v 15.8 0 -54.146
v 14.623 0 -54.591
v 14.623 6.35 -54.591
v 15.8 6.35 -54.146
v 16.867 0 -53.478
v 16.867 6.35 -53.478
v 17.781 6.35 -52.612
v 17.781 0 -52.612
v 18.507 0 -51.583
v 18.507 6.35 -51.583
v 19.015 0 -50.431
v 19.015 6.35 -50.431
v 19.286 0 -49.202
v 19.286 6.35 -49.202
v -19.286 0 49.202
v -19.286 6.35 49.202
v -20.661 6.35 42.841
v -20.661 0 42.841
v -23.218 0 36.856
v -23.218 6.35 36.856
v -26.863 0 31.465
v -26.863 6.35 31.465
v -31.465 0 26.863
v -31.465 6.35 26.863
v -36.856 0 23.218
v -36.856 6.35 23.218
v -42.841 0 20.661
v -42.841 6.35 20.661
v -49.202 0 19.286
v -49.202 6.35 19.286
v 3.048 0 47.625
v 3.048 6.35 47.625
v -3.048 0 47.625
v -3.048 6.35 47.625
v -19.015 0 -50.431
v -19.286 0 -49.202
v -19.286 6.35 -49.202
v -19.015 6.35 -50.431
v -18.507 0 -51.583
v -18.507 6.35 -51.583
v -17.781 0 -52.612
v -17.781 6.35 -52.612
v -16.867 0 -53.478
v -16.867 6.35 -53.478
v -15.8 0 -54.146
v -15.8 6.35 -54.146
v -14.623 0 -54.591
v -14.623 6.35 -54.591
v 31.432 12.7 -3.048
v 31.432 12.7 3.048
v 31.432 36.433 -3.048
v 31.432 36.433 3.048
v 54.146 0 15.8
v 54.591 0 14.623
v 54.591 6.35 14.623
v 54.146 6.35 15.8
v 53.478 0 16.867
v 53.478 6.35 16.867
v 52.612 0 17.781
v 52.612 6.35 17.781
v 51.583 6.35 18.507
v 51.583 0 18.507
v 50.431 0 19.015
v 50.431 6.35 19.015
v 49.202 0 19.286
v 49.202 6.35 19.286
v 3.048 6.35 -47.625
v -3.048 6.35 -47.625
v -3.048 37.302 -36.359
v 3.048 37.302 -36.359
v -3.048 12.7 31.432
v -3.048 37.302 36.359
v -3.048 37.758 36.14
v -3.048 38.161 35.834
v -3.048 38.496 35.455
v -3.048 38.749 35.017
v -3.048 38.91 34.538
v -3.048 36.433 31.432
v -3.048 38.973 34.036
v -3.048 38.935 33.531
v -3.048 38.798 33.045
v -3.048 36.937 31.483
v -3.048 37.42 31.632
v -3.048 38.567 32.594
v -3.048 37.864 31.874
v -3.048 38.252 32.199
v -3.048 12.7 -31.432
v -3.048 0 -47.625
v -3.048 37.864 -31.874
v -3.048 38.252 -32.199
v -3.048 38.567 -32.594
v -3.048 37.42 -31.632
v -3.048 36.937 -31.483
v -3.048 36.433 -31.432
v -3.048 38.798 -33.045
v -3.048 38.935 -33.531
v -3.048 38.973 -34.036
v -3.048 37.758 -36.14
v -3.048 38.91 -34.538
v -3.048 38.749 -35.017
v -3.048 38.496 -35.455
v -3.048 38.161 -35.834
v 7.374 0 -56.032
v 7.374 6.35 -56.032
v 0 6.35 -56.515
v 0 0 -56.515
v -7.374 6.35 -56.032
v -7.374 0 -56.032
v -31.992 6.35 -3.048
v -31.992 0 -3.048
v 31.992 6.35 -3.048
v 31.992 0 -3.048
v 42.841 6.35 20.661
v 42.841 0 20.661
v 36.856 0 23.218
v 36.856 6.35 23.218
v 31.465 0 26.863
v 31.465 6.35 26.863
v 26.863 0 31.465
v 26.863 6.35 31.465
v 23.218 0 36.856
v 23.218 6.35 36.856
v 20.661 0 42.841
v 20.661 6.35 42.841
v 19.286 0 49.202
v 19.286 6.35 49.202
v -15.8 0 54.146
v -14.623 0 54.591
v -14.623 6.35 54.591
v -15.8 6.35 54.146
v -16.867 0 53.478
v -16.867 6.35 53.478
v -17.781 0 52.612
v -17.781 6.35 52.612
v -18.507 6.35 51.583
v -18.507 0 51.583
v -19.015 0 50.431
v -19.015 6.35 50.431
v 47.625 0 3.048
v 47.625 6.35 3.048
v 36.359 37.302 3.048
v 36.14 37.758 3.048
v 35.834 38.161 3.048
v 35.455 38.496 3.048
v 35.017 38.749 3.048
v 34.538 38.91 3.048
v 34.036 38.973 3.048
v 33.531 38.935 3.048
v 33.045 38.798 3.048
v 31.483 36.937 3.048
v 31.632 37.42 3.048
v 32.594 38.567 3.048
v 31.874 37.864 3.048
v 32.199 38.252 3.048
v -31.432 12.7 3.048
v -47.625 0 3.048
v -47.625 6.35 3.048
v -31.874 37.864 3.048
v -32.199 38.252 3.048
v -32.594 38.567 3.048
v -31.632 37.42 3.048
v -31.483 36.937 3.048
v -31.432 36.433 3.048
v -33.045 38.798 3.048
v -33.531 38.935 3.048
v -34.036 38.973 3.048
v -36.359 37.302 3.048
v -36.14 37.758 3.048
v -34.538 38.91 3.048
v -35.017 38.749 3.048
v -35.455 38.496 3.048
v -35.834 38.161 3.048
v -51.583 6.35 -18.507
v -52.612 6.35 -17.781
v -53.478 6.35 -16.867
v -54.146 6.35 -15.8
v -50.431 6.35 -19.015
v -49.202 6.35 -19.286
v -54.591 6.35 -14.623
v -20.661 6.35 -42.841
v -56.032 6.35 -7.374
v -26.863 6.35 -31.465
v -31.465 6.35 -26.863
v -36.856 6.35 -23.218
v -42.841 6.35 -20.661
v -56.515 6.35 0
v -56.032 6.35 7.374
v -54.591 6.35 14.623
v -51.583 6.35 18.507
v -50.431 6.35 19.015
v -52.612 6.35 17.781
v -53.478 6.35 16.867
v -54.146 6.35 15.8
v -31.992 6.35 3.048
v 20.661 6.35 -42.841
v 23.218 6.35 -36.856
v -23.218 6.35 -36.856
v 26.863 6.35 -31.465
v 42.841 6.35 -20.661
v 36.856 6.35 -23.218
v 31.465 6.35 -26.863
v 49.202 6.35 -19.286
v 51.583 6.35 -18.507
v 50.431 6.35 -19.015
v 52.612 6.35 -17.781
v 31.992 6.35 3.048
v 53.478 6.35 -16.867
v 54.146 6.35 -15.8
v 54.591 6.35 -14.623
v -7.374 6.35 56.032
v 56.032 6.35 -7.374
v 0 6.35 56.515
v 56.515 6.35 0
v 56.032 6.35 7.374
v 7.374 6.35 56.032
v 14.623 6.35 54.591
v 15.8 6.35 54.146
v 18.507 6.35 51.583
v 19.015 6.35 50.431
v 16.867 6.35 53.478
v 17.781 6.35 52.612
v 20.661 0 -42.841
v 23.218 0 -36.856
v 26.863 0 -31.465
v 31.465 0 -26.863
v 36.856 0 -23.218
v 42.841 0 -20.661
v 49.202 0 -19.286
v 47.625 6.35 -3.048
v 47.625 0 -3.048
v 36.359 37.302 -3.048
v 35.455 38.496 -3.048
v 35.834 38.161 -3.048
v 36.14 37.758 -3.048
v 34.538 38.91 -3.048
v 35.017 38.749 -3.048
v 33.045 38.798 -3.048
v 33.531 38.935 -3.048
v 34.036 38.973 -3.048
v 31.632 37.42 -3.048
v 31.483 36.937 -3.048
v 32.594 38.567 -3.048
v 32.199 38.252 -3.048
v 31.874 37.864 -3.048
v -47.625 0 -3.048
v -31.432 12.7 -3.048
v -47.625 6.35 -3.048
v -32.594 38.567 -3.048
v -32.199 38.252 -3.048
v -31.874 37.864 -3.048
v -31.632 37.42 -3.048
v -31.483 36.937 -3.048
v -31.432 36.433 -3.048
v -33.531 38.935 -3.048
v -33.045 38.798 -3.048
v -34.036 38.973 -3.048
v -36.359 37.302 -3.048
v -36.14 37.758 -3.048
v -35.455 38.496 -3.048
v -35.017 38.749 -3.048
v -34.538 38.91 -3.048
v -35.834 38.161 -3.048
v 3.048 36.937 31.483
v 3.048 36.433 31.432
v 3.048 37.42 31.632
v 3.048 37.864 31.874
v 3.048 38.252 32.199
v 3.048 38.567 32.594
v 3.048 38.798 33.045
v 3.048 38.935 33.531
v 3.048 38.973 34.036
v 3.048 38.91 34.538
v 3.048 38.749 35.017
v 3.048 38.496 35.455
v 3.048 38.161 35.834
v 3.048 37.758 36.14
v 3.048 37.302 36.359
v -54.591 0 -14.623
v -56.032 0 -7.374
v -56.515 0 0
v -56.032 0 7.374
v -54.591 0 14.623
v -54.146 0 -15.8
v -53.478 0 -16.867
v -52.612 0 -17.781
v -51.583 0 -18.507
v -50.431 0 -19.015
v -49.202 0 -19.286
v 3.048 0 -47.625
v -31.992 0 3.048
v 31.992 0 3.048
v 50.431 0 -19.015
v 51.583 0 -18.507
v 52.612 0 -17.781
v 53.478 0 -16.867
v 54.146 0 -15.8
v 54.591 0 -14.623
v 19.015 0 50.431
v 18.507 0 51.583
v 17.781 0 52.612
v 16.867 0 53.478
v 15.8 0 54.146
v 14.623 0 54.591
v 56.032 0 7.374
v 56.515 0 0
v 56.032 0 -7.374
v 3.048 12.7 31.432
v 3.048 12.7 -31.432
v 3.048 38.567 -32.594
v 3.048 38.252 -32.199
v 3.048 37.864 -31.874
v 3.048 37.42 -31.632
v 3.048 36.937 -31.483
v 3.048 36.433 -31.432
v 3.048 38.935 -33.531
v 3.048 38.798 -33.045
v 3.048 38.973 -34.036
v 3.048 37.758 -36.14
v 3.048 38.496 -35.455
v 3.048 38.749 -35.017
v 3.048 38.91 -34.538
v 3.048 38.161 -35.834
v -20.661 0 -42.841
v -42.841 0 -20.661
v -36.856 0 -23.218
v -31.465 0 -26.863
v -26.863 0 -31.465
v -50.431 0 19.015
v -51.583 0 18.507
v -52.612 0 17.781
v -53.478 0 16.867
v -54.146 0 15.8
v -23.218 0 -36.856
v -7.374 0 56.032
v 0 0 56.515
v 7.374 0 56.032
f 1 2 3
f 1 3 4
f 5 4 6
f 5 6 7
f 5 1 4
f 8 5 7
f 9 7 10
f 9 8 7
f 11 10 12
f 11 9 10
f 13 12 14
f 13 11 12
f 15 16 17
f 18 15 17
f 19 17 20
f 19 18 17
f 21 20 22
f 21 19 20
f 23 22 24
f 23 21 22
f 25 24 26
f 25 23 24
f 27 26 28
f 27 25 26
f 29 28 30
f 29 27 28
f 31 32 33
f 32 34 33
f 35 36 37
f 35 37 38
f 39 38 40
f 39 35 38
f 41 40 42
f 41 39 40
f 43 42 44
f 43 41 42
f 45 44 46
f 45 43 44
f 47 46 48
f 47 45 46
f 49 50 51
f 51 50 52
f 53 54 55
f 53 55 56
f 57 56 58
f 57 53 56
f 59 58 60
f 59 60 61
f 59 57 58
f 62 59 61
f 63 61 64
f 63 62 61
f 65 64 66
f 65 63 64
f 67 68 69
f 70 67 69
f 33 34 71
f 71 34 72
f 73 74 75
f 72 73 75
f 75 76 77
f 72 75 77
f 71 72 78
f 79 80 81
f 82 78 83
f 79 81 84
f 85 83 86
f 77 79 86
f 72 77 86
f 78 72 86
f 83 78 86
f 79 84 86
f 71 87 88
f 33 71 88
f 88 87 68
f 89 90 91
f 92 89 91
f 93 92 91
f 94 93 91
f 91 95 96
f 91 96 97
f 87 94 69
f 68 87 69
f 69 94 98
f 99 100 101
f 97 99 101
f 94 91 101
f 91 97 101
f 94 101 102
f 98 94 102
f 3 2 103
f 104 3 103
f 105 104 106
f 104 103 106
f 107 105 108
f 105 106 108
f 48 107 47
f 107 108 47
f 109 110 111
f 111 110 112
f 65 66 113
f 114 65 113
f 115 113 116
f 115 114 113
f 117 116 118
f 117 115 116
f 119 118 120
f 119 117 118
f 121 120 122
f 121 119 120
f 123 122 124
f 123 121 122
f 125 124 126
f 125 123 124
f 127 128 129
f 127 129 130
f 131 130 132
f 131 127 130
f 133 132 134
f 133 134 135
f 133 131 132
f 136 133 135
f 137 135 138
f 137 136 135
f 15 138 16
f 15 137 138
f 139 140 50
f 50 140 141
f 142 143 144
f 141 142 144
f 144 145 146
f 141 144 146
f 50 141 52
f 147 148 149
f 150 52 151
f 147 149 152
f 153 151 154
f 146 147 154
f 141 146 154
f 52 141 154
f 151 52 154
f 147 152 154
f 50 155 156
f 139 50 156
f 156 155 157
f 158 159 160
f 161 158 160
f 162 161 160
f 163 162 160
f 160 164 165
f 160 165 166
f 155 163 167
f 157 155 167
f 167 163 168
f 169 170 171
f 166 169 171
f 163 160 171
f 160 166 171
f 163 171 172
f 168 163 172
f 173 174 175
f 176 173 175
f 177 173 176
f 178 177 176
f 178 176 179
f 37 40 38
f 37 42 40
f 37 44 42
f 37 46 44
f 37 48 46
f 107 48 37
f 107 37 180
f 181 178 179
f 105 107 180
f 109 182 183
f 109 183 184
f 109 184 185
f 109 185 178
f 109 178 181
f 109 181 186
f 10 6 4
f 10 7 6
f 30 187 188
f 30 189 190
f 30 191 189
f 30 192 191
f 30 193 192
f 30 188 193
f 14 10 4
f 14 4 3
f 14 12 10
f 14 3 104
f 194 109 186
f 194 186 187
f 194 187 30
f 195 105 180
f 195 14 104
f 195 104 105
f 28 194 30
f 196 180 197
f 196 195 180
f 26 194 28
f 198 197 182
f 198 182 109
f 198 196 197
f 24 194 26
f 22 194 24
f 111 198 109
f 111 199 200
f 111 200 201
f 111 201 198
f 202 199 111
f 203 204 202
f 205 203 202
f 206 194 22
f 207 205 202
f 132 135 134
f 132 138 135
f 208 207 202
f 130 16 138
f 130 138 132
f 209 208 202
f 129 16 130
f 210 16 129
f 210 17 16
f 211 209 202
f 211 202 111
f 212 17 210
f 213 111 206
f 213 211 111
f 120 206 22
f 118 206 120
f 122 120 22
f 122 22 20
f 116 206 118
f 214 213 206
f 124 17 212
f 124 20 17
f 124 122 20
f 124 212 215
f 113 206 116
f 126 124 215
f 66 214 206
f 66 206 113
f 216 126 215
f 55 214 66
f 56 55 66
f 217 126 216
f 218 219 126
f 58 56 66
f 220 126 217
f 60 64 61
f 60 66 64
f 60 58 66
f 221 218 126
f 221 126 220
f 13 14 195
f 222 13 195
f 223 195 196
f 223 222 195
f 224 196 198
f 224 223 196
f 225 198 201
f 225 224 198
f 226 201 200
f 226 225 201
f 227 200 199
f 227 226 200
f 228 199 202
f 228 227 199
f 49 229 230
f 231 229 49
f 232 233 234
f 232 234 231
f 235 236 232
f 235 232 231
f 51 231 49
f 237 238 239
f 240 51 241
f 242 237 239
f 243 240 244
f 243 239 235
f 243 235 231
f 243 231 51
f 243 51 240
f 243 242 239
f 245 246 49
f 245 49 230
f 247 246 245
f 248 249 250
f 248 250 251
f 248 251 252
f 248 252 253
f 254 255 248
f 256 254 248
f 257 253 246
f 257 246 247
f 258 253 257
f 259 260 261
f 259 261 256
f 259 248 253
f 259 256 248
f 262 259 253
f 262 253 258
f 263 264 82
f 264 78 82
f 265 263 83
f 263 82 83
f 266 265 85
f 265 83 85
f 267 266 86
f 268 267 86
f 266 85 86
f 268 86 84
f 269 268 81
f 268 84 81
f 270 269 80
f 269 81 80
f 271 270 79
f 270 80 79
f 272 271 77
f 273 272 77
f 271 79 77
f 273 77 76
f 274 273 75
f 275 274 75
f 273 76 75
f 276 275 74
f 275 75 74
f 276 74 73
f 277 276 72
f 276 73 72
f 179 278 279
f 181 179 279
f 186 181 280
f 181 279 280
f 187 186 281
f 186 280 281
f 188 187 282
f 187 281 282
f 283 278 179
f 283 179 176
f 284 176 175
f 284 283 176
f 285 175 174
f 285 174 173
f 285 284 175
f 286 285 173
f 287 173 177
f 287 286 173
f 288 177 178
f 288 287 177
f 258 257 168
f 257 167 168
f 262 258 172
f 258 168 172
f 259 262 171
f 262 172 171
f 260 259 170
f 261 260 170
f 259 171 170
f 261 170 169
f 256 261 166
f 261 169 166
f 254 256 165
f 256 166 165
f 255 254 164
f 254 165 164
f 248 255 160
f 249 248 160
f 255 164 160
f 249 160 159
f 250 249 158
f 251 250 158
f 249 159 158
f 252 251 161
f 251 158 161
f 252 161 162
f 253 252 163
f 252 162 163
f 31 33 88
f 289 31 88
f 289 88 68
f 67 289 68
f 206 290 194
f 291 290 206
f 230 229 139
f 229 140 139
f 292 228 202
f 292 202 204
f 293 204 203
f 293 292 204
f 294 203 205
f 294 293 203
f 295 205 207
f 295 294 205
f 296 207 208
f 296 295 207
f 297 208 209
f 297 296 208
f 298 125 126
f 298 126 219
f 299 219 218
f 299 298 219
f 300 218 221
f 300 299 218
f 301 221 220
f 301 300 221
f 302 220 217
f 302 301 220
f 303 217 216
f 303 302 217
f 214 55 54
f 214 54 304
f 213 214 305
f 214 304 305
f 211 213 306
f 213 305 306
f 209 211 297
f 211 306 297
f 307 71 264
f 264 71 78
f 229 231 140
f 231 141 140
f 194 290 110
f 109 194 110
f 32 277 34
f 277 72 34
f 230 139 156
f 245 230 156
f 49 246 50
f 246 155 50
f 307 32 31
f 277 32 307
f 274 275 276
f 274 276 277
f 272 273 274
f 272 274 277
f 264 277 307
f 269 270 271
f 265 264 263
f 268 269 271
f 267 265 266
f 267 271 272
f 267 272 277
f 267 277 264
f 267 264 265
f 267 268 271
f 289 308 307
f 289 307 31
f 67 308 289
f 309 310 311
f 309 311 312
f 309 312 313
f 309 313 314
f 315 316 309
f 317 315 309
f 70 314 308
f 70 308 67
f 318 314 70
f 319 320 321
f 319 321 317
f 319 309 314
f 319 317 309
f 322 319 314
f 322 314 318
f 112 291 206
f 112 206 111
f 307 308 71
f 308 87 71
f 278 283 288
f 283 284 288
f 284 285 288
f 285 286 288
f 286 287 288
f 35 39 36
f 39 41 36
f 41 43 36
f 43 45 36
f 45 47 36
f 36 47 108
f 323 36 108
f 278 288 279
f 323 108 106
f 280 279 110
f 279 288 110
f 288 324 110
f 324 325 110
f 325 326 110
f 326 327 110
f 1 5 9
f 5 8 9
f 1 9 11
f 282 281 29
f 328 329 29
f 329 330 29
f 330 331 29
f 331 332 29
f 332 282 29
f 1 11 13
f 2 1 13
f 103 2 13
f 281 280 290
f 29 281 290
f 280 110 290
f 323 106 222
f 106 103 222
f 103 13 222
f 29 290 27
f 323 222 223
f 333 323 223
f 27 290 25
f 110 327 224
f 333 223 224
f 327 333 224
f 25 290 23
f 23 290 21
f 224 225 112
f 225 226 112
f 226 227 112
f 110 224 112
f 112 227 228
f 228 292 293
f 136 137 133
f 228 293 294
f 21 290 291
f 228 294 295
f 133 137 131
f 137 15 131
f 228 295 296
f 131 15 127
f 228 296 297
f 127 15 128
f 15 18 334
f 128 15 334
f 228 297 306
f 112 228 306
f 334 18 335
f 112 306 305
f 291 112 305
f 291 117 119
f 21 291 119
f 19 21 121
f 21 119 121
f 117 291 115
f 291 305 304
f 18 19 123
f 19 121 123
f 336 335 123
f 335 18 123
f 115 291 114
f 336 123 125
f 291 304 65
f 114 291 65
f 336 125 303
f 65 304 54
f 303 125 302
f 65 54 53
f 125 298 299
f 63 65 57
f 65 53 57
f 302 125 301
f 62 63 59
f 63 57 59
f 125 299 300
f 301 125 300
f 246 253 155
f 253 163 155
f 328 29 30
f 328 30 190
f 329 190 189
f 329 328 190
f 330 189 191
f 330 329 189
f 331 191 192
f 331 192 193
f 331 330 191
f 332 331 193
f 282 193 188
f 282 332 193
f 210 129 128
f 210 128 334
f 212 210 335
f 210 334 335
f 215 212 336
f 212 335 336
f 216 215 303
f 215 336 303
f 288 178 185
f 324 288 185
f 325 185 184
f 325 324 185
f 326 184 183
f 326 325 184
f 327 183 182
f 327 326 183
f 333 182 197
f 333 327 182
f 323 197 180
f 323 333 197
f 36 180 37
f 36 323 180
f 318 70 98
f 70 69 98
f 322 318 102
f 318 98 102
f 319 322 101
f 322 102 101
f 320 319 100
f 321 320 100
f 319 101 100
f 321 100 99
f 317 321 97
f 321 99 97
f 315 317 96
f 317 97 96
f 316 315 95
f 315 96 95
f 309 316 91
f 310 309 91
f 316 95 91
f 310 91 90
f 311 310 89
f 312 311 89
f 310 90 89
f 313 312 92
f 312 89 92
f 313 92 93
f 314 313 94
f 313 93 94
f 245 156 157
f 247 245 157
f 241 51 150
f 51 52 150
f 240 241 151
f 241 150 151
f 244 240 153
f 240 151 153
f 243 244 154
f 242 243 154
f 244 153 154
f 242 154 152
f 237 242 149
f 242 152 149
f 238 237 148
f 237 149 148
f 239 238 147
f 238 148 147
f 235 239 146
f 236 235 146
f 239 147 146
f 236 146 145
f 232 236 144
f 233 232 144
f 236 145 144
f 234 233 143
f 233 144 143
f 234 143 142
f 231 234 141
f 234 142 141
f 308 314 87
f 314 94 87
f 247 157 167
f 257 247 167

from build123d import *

# Parameters (mm, degrees)
SKETCH1_R           = 56.515
SKETCH1_W           = 63.983450824
SKETCH1_H           = 6.096
BOSS_EXTRUDE1_DEPTH = 6.35
BOSS_EXTRUDE2_DEPTH = 3.048
CIRPATTERN1_COUNT   = 2
CIRPATTERN1_ANGLE   = 90
SKETCH3_R           = 34.157543873
CUT_EXTRUDE1_DEPTH  = 89.920312598
FILLET1_START       = -1
FILLET1_DEPTH       = 8
CIRPATTERN2_COUNT   = 4


with BuildPart() as part:
    # Sketch1 → Boss-Extrude1 (new body)
    with BuildSketch(Plane(origin=(0, 0, 0), x_dir=(1, 0, 0), z_dir=(0, 1, 0))):
        with Locations(Location((0, 0, 0), (0, 0, 270))):
            Circle(SKETCH1_R)
        Rectangle(SKETCH1_W, SKETCH1_H, mode=Mode.SUBTRACT)
    extrude(amount=BOSS_EXTRUDE1_DEPTH)

    # Sketch3 → Cut-Extrude1 (cut, through all)
    with BuildSketch(Plane(origin=(0, 0, 0), x_dir=(1, 0, 0), z_dir=(0, 1, 0))):
        with Locations((-53.207543873, 53.207543873)):
            Circle(SKETCH3_R)
    cut_extrude1 = extrude(amount=CUT_EXTRUDE1_DEPTH, mode=Mode.SUBTRACT)

    # Fillet1: read off the stored shape, not the designer's step
    # Fillet1 outline → Fillet1 (cut)
    with BuildSketch(Plane(origin=(0, 0, 0), x_dir=(1, 0, 0), z_dir=(0, 1, 0)).offset(FILLET1_START)):
        with BuildLine():
            ThreePointArc((-53.207543873, 19.05), (-53.944482234, 16.850461759), (-54.590536828, 14.622534453))
            ThreePointArc((-54.590536828, 14.622534453), (-52.611862262, 17.781396141), (-49.201504559, 19.285730059))
            ThreePointArc((-49.201504559, 19.285730059), (-51.201059407, 19.108983441), (-53.207543873, 19.05))
        make_face()
        with BuildLine():
            ThreePointArc((-19.285730059, 49.201504559), (-17.781396141, 52.611862262), (-14.622534453, 54.590536828))
            ThreePointArc((-14.622534453, 54.590536828), (-16.850461759, 53.944482234), (-19.05, 53.207543873))
            ThreePointArc((-19.05, 53.207543873), (-19.108983441, 51.201059407), (-19.285730059, 49.201504559))
        make_face()
    fillet1 = extrude(amount=FILLET1_DEPTH, mode=Mode.SUBTRACT)

    # CirPattern2: Cut-Extrude1, Fillet1 ×4 about axis
    cirpattern2_axis = Axis((0, 0, 0), (0, 1, 0))
    add([cut_extrude1.rotate(cirpattern2_axis, i * 360 / CIRPATTERN2_COUNT) for i in range(1, CIRPATTERN2_COUNT)], mode=Mode.SUBTRACT)
    add([fillet1.rotate(cirpattern2_axis, i * 360 / CIRPATTERN2_COUNT) for i in range(1, CIRPATTERN2_COUNT)], mode=Mode.SUBTRACT)


with BuildPart() as body_2:
    # Sketch2 → Boss-Extrude2 (new, symmetric)
    with BuildSketch(Plane.XY):
        with BuildLine():
            Line((-47.625, 6.35), (-36.359319257, 37.302203457))
            ThreePointArc((-36.359319257, 37.302203457), (-33.531433629, 38.934883985), (-31.4325, 36.433472293))
            Line((-31.4325, 36.433472293), (-31.4325, 12.7))
            Line((-31.4325, 12.7), (31.4325, 12.7))
            Line((31.4325, 12.7), (31.4325, 36.433472293))
            ThreePointArc((31.4325, 36.433472293), (33.531433629, 38.934883985), (36.359319257, 37.302203457))
            Line((36.359319257, 37.302203457), (47.625, 6.35))
            Line((47.625, 6.35), (47.625, 0))
            Line((47.625, 0), (-47.625, 0))
            Line((-47.625, 0), (-47.625, 6.35))
        make_face()
    extrude(amount=BOSS_EXTRUDE2_DEPTH, both=True)


with BuildPart() as cirpattern1_1:
    # CirPattern1: pattern copy
    add(body_2.part.rotate(Axis((0, 0, 0), (0, -1, 0)), 1 * CIRPATTERN1_ANGLE / (CIRPATTERN1_COUNT - 1)))


solid = Compound([part.part, body_2.part, cirpattern1_1.part])
